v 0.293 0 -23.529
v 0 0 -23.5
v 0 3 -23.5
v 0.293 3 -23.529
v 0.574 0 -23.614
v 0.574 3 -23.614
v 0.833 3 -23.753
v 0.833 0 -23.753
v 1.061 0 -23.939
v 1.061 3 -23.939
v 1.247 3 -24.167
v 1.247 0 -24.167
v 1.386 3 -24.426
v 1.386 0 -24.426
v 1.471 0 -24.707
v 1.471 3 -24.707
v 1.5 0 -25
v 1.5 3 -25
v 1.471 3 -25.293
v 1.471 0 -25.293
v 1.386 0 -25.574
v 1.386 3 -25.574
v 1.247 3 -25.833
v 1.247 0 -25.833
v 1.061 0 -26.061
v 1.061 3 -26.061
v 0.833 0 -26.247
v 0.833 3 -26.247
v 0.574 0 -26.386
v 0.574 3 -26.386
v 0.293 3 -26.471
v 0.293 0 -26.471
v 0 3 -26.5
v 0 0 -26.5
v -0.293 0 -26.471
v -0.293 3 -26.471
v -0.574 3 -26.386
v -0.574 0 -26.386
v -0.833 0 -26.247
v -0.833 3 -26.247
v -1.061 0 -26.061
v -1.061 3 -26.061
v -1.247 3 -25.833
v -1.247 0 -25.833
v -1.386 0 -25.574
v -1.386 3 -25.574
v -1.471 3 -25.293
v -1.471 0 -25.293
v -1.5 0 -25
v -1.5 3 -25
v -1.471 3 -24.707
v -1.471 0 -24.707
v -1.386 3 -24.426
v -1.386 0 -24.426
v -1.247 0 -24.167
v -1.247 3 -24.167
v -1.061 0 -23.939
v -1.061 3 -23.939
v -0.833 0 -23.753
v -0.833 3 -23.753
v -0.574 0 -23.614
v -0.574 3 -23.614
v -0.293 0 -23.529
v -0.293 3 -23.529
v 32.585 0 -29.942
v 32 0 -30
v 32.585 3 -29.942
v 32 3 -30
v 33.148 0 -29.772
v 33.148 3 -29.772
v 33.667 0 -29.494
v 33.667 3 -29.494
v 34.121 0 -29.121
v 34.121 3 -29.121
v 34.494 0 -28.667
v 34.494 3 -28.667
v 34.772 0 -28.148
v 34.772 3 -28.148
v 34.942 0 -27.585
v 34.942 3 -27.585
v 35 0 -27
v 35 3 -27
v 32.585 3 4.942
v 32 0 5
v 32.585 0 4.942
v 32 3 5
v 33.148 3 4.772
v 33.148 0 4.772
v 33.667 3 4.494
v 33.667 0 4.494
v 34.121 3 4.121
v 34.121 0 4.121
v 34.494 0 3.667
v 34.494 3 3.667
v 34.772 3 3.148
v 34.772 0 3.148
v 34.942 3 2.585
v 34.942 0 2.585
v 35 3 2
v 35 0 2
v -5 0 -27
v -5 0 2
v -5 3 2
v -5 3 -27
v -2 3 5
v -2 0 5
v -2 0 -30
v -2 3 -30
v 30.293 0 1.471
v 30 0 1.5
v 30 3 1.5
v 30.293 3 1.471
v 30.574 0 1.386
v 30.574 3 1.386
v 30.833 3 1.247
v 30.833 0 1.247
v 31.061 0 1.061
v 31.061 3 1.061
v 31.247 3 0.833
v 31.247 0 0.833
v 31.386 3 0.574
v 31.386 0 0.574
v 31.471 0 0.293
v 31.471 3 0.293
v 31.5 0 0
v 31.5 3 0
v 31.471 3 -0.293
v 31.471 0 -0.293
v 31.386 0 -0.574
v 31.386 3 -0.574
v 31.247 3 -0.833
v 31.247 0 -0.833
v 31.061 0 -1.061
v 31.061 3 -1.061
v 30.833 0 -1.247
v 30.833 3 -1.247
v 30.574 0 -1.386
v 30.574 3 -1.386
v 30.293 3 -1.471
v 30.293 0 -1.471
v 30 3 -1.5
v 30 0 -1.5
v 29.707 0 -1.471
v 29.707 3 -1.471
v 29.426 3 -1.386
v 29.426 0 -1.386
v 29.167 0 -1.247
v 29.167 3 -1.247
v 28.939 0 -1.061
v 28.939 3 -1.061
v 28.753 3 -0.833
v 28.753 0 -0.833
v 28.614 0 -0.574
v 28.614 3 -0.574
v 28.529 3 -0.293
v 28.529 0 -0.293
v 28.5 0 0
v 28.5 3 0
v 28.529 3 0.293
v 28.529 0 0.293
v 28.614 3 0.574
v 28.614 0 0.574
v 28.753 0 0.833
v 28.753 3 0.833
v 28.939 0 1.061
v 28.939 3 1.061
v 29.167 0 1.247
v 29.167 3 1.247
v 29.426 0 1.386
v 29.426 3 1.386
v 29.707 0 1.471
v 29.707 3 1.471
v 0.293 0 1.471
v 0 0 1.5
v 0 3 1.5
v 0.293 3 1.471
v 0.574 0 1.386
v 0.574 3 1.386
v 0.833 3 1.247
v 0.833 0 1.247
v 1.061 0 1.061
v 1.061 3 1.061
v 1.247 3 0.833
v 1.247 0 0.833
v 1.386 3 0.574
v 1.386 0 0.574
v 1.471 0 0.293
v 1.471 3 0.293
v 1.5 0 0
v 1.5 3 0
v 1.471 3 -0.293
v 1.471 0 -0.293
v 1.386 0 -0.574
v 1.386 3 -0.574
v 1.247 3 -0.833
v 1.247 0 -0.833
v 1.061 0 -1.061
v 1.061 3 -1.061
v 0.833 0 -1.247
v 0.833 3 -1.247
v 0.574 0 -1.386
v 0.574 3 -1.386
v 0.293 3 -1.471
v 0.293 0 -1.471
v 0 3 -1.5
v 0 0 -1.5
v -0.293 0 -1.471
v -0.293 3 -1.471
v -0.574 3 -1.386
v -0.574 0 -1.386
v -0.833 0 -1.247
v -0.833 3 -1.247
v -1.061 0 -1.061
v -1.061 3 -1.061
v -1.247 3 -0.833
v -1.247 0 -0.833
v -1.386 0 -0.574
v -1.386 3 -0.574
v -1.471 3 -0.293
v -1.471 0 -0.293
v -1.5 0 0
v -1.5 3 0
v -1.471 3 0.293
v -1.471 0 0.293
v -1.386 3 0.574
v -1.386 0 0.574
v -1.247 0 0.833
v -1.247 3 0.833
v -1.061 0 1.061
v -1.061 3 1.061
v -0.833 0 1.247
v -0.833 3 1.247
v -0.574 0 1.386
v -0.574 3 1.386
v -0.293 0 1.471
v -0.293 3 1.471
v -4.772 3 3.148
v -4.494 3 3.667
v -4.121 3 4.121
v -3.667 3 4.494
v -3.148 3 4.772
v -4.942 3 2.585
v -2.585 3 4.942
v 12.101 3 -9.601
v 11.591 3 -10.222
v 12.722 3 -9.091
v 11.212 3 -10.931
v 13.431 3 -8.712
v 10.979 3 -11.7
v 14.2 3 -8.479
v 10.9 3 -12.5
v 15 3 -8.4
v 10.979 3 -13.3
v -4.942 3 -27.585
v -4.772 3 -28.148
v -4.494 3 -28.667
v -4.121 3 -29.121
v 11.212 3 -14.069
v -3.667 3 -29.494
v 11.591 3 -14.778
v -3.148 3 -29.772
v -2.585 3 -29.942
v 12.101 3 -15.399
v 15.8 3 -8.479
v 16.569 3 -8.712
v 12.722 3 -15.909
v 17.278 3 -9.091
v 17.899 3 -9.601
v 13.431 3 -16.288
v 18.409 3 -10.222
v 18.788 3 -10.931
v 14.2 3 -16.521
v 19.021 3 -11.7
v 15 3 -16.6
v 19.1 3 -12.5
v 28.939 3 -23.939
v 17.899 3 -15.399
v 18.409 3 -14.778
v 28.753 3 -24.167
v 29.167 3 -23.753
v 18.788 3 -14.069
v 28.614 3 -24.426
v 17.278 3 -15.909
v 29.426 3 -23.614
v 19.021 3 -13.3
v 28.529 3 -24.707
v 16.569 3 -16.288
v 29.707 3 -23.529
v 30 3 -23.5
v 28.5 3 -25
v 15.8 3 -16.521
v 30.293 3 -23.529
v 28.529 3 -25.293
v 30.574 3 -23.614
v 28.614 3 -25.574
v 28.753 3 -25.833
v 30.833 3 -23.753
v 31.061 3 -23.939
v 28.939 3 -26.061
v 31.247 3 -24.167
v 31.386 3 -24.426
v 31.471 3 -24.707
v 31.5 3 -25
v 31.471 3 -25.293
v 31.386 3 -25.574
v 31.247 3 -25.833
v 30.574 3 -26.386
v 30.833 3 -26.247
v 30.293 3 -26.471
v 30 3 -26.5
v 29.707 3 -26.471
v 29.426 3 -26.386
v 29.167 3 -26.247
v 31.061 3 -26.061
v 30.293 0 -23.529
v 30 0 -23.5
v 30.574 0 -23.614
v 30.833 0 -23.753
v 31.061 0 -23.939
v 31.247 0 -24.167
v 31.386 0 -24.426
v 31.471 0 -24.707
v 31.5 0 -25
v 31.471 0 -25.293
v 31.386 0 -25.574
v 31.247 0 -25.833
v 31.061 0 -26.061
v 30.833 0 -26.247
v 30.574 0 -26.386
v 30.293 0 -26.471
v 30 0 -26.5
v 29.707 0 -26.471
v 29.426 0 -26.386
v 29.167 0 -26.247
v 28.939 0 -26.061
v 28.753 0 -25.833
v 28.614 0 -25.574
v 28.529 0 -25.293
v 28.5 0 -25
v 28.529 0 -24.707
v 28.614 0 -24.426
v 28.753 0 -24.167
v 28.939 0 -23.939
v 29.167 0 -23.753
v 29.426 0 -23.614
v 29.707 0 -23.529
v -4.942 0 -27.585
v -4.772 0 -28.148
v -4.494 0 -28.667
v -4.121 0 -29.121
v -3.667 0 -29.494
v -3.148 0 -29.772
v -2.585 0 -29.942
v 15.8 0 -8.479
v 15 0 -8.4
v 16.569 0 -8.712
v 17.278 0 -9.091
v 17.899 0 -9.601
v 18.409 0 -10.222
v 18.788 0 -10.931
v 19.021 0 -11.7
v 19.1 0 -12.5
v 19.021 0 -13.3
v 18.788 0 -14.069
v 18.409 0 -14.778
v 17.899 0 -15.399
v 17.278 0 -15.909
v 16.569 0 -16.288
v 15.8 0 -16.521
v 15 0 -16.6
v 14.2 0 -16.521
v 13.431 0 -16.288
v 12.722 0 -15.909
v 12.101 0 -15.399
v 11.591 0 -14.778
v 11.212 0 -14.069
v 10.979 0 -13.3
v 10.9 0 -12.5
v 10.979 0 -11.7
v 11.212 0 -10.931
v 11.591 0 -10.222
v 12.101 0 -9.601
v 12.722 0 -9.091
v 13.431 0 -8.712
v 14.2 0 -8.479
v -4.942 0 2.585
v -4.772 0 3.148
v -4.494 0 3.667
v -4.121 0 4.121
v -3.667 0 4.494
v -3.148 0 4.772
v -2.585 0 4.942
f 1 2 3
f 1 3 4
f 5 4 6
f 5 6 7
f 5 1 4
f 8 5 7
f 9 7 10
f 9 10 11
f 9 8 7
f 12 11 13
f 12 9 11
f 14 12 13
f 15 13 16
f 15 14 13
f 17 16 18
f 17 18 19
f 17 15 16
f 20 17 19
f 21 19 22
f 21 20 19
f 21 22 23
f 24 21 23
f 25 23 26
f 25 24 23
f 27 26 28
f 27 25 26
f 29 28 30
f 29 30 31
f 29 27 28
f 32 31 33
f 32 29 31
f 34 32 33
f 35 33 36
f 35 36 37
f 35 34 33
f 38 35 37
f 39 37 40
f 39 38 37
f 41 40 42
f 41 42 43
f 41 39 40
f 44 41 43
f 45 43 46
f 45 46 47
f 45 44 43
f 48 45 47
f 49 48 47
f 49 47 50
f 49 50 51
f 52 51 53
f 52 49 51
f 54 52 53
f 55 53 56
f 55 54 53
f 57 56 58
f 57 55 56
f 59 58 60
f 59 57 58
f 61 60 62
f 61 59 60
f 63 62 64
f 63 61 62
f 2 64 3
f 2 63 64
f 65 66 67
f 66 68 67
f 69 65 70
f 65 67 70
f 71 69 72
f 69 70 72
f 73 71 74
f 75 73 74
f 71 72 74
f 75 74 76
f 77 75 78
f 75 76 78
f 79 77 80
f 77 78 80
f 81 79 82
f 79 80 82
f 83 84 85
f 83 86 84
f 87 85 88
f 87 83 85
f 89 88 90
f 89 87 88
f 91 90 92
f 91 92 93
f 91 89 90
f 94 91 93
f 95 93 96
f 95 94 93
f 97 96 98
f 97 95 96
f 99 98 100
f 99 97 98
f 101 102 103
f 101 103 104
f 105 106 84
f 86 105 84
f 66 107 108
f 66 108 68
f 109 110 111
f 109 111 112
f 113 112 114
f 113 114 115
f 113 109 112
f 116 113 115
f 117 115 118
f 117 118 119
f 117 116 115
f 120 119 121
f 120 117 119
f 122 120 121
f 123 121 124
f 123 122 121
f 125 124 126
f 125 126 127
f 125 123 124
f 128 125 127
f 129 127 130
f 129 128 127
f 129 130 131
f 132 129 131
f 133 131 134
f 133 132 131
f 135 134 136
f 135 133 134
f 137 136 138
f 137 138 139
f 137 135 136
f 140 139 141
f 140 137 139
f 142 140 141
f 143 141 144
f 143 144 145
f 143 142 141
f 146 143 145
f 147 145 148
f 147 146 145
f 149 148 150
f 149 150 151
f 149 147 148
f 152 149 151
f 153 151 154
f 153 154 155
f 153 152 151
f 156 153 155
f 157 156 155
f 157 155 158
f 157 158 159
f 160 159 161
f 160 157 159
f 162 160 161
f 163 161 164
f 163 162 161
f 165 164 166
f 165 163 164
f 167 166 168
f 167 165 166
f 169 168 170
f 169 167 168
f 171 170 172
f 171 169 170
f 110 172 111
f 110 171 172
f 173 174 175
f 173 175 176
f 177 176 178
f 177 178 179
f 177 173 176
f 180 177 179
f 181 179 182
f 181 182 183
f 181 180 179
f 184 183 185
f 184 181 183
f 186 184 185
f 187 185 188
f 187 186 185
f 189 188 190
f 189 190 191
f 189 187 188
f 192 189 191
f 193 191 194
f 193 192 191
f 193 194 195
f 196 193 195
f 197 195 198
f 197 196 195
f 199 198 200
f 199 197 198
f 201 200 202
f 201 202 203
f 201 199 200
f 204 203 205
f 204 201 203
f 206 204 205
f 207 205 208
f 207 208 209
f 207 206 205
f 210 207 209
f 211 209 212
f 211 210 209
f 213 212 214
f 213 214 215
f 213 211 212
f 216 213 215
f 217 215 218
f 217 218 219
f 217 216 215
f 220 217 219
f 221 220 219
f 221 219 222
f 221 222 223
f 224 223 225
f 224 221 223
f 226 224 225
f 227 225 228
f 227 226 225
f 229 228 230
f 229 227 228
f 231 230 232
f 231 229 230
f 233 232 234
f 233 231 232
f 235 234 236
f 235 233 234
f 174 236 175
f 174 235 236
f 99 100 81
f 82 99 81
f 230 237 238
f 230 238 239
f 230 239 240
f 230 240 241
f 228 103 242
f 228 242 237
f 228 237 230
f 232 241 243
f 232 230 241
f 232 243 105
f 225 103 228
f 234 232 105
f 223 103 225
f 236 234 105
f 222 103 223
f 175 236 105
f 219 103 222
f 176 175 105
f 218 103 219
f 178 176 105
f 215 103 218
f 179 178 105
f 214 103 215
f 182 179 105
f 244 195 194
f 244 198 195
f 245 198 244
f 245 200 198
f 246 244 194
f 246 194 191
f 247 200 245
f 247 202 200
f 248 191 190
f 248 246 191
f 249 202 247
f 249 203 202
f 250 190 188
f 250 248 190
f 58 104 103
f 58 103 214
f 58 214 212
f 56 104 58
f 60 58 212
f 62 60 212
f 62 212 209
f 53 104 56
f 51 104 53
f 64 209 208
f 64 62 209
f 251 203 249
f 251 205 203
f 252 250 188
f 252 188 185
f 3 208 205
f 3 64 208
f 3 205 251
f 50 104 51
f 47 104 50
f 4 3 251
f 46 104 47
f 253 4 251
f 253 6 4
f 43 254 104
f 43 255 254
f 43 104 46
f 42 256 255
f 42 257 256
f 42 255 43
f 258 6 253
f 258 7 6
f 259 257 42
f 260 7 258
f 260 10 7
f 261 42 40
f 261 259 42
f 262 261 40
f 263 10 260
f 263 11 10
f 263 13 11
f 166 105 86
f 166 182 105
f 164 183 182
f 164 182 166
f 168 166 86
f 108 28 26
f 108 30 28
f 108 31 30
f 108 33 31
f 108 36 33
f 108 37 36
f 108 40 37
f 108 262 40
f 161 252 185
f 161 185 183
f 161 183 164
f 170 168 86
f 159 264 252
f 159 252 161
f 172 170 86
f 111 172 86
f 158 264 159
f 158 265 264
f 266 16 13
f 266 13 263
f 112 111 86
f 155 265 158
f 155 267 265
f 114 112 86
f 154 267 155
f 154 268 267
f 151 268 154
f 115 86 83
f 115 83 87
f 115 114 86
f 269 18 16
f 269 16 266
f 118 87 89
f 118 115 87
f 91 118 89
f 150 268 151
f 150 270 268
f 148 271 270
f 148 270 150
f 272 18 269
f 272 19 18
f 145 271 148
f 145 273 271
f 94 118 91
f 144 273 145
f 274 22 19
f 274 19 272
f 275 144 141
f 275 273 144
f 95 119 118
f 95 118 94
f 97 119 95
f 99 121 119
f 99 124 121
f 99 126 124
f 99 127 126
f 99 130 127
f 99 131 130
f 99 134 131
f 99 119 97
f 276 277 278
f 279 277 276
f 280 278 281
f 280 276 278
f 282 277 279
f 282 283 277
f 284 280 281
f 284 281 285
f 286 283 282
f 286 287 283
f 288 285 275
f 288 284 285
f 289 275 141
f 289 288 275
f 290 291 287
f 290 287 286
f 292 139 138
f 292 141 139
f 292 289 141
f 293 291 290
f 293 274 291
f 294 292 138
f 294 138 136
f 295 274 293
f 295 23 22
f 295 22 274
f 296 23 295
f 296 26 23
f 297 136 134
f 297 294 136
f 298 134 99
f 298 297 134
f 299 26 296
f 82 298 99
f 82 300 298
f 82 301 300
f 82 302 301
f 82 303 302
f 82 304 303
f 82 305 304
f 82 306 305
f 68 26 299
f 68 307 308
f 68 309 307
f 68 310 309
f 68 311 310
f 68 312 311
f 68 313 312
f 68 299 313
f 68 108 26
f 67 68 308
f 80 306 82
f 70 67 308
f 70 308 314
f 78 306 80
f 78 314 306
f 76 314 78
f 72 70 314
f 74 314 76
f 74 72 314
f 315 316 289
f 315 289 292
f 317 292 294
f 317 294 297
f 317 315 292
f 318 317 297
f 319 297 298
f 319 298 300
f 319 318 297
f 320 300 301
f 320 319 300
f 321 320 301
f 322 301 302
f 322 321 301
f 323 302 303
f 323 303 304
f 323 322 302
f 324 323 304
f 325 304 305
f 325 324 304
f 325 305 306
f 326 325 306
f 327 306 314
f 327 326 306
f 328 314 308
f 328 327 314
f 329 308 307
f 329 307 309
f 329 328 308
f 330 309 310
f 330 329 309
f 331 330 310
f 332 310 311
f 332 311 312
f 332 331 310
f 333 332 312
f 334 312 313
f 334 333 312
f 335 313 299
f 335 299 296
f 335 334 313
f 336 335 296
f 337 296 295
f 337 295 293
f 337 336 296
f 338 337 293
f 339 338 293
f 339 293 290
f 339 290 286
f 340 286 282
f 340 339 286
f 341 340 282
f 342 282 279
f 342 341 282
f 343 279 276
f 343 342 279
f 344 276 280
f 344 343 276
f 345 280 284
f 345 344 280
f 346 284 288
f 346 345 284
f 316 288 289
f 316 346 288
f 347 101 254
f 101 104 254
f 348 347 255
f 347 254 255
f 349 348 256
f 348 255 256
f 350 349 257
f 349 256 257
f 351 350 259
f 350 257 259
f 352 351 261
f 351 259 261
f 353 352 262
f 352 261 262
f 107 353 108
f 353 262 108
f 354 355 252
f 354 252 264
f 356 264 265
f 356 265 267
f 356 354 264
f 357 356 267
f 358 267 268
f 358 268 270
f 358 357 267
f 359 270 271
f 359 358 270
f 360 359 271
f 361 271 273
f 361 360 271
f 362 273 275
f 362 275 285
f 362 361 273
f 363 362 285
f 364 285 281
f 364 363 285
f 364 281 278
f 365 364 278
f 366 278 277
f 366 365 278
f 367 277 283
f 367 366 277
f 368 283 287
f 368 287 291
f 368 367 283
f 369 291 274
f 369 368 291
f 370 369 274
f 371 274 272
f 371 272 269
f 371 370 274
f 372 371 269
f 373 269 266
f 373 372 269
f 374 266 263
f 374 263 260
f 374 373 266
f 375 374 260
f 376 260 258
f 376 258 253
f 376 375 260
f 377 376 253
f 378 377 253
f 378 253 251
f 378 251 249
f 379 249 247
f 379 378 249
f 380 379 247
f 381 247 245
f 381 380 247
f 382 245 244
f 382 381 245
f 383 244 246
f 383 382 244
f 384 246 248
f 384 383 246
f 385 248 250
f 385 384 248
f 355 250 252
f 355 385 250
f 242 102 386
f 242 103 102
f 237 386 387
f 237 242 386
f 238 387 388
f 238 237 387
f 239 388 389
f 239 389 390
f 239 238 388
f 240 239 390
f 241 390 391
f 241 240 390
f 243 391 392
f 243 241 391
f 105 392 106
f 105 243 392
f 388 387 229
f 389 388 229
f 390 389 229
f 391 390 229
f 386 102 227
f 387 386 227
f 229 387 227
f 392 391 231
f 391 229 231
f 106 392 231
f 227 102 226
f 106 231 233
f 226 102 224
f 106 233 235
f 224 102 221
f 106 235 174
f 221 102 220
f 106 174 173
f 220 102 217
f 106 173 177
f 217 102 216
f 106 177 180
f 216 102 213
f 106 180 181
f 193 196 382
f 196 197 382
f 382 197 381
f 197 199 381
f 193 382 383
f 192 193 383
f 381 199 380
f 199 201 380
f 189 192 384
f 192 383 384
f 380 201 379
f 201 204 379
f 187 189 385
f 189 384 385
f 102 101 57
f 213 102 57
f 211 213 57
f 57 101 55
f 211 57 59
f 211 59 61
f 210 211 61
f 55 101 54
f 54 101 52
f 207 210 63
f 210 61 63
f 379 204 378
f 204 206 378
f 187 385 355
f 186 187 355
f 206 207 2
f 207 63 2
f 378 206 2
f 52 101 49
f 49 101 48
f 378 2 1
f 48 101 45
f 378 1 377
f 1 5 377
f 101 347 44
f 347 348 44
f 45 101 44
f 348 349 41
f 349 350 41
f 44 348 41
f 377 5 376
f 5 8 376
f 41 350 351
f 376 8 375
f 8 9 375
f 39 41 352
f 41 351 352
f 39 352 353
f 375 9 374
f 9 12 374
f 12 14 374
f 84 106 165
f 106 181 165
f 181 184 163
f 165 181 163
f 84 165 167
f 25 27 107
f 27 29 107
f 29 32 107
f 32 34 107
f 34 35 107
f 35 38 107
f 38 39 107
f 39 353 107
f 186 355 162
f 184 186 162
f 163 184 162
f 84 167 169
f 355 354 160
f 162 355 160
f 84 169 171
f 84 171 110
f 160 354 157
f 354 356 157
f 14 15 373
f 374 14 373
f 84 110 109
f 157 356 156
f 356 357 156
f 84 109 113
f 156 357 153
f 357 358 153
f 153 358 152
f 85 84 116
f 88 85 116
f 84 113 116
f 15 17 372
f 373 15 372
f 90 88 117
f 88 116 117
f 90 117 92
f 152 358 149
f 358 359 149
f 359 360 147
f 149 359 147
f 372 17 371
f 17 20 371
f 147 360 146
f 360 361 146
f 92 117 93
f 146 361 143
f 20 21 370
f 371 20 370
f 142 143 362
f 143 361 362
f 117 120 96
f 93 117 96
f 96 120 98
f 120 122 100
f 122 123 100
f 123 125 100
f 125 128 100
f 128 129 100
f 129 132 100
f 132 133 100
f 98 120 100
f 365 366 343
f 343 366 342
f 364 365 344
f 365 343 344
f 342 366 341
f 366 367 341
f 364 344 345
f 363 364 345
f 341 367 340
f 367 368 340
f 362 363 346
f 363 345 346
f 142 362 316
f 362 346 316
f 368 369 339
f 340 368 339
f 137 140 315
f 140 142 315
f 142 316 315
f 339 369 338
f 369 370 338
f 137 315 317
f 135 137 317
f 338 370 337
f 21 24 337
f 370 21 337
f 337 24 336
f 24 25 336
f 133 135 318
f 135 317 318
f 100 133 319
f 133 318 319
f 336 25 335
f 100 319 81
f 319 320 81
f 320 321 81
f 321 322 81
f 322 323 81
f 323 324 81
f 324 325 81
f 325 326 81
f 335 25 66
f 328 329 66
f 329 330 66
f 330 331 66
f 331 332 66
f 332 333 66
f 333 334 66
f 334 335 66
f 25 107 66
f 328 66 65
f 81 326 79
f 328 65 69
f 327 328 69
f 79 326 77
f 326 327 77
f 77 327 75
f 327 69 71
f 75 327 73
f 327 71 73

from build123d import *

# Parameters (mm, degrees)
SKETCH1_W           = 40
SKETCH1_H           = 35
SKETCH1_R           = 1.5
SKETCH1_R_2         = 4.1
BOSS_EXTRUDE1_DEPTH = 3
FILLET1_R           = 3


with BuildPart() as part:
    # Sketch1 → Boss-Extrude1 (new body)
    with BuildSketch(Plane(origin=(0, 0, 0), x_dir=(1, 0, 0), z_dir=(0, 1, 0))):
        with Locations((15, 12.5)):
            Rectangle(SKETCH1_W, SKETCH1_H)
        Circle(SKETCH1_R, mode=Mode.SUBTRACT)
        with Locations((30, 0)):
            Circle(SKETCH1_R, mode=Mode.SUBTRACT)
        with Locations((0, 25)):
            Circle(SKETCH1_R, mode=Mode.SUBTRACT)
        with Locations((30, 25)):
            Circle(SKETCH1_R, mode=Mode.SUBTRACT)
        with Locations((15, 12.5)):
            Circle(SKETCH1_R_2, mode=Mode.SUBTRACT)
    extrude(amount=BOSS_EXTRUDE1_DEPTH)

    # Fillet1
    fillet1_edges = [part.edges().sort_by_distance(p)[0] for p in [
        (35, 1.5, 5),
        (-5, 1.5, 5),
        (35, 1.5, -30),
        (-5, 1.5, -30),
    ]]
    fillet(fillet1_edges, radius=FILLET1_R)


solid = part.part
